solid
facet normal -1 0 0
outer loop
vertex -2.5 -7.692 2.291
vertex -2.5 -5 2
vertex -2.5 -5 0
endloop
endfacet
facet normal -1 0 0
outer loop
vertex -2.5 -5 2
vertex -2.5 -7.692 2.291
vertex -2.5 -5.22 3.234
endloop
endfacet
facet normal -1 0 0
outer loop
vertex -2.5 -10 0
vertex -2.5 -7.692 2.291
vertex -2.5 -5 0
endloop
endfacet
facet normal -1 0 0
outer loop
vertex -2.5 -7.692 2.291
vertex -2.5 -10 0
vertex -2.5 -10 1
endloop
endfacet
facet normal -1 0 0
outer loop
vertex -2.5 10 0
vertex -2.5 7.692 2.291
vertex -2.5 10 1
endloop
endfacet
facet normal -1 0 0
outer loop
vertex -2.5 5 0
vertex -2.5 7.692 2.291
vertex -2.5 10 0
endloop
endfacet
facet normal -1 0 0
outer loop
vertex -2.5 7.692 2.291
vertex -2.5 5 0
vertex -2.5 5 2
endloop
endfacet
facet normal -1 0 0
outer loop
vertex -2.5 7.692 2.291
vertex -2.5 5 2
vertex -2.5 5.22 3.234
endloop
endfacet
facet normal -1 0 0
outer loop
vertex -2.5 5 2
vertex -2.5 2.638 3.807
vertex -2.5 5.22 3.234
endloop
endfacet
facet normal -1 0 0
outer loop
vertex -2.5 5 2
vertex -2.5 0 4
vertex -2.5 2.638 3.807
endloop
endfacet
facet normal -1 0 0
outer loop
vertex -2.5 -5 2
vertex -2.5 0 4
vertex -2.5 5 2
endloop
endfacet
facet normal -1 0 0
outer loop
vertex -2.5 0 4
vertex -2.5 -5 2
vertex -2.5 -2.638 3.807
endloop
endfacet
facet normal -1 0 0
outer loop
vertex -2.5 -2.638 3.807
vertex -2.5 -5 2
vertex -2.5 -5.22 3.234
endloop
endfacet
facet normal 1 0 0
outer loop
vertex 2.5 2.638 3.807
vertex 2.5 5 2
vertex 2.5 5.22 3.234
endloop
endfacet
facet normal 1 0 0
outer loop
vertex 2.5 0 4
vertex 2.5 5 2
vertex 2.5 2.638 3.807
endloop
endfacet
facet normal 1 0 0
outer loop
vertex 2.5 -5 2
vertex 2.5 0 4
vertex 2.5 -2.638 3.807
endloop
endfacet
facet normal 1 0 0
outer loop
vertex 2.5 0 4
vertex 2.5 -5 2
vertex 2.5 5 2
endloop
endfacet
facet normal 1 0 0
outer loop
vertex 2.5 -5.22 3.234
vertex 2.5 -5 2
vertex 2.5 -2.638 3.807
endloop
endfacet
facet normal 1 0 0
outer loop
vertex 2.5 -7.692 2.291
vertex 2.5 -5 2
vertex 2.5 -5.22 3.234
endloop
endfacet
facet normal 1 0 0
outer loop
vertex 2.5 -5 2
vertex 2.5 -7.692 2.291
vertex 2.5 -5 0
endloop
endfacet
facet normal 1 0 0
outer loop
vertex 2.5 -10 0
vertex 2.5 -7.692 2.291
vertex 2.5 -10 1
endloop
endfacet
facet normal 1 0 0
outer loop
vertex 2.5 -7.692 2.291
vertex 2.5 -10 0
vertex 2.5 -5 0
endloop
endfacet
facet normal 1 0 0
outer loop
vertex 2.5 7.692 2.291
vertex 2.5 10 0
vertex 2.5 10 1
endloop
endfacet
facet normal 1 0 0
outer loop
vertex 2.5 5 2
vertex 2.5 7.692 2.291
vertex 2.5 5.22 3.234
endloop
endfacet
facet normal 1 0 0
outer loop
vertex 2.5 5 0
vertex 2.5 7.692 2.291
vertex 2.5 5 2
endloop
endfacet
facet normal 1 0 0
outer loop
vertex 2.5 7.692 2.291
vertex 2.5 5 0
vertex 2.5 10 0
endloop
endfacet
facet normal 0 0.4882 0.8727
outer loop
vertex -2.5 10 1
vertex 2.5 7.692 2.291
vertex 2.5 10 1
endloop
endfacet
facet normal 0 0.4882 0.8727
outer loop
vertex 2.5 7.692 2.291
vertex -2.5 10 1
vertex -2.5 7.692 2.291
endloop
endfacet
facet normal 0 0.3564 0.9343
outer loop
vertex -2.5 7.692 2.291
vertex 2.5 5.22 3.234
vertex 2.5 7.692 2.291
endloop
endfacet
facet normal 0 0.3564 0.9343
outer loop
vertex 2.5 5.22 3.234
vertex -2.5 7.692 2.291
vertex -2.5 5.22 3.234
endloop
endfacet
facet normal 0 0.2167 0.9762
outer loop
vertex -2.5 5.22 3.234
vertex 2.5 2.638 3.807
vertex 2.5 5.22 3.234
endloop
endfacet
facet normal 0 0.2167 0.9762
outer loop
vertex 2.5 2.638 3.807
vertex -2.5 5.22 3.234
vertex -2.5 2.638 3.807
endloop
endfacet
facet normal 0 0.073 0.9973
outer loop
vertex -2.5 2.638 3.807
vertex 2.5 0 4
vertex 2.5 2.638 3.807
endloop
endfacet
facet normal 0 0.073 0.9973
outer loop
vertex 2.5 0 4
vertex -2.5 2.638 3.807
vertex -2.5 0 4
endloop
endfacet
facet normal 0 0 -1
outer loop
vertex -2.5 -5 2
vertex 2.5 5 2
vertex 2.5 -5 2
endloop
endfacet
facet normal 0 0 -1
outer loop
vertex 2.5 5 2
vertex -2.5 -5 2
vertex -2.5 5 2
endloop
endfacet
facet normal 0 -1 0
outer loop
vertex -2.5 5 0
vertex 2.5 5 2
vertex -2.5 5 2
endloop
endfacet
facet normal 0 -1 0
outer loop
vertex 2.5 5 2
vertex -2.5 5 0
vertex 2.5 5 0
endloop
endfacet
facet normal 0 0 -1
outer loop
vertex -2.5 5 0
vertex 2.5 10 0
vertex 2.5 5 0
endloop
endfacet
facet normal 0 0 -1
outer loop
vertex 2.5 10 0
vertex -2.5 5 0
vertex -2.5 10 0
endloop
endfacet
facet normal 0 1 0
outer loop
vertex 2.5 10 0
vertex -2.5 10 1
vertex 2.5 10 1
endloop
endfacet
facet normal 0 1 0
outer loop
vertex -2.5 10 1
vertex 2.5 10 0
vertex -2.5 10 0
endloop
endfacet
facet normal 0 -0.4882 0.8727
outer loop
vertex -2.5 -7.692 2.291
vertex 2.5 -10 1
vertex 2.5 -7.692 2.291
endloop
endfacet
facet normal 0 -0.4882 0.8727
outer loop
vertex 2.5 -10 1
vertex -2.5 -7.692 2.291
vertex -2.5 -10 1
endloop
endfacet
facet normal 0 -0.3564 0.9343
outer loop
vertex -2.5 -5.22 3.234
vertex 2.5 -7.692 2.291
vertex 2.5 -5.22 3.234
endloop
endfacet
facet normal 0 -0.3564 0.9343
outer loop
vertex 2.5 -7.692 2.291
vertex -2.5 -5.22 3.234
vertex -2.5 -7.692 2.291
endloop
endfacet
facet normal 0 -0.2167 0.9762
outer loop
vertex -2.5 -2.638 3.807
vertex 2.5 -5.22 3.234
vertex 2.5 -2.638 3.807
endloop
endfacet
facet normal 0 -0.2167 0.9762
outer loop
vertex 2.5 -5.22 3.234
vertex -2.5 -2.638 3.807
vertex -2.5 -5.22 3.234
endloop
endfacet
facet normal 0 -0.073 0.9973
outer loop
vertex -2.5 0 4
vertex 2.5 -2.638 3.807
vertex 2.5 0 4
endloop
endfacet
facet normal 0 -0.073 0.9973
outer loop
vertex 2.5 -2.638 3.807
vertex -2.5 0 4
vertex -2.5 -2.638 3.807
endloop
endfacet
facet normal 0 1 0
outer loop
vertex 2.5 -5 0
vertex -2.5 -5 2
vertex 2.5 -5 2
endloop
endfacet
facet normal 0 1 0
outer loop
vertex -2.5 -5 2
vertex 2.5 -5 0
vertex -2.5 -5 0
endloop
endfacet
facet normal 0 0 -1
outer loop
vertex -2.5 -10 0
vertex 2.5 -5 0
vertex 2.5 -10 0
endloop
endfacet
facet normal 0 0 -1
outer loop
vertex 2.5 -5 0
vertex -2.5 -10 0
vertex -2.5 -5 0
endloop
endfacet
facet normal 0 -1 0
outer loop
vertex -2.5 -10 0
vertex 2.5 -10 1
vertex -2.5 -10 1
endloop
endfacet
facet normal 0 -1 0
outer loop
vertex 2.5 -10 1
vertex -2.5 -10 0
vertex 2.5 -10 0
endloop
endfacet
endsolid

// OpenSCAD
// plate_bow_1x4_double

// external vars #########################

ext_scale = 1.0;
ext_fn = 12;

// part ##################################

module plate_bow_1x4_double(m_scale=ext_scale,m_fn=ext_fn) {
    scale([m_scale,m_scale,m_scale])
    translate([-2.5,0,0]) rotate([0,0,90])
    union() {
        pts_base = [[10,1],[10,0],[5,0],[5,2],[-1,2],[0,4]];
        hyp_bow = sqrt(109);
        r_bow = (hyp_bow/2)/(3/hyp_bow);
        u_bow = r_bow-4;
        ang_bow = (90-acos(3/hyp_bow))*2;
        div = m_fn/3;
        pts_arc = [for (i=[1:div-1]) let (ang = 90-(ang_bow/div)*i) [cos(ang)*r_bow,sin(ang)*r_bow-u_bow]];
        pts = concat(pts_base,pts_arc);
        rotate([90,0,0]) linear_extrude(height=5) polygon(pts);
        mirror([1,0,0]) rotate([90,0,0]) linear_extrude(height=5) polygon(pts);
    }
}

plate_bow_1x4_double();
